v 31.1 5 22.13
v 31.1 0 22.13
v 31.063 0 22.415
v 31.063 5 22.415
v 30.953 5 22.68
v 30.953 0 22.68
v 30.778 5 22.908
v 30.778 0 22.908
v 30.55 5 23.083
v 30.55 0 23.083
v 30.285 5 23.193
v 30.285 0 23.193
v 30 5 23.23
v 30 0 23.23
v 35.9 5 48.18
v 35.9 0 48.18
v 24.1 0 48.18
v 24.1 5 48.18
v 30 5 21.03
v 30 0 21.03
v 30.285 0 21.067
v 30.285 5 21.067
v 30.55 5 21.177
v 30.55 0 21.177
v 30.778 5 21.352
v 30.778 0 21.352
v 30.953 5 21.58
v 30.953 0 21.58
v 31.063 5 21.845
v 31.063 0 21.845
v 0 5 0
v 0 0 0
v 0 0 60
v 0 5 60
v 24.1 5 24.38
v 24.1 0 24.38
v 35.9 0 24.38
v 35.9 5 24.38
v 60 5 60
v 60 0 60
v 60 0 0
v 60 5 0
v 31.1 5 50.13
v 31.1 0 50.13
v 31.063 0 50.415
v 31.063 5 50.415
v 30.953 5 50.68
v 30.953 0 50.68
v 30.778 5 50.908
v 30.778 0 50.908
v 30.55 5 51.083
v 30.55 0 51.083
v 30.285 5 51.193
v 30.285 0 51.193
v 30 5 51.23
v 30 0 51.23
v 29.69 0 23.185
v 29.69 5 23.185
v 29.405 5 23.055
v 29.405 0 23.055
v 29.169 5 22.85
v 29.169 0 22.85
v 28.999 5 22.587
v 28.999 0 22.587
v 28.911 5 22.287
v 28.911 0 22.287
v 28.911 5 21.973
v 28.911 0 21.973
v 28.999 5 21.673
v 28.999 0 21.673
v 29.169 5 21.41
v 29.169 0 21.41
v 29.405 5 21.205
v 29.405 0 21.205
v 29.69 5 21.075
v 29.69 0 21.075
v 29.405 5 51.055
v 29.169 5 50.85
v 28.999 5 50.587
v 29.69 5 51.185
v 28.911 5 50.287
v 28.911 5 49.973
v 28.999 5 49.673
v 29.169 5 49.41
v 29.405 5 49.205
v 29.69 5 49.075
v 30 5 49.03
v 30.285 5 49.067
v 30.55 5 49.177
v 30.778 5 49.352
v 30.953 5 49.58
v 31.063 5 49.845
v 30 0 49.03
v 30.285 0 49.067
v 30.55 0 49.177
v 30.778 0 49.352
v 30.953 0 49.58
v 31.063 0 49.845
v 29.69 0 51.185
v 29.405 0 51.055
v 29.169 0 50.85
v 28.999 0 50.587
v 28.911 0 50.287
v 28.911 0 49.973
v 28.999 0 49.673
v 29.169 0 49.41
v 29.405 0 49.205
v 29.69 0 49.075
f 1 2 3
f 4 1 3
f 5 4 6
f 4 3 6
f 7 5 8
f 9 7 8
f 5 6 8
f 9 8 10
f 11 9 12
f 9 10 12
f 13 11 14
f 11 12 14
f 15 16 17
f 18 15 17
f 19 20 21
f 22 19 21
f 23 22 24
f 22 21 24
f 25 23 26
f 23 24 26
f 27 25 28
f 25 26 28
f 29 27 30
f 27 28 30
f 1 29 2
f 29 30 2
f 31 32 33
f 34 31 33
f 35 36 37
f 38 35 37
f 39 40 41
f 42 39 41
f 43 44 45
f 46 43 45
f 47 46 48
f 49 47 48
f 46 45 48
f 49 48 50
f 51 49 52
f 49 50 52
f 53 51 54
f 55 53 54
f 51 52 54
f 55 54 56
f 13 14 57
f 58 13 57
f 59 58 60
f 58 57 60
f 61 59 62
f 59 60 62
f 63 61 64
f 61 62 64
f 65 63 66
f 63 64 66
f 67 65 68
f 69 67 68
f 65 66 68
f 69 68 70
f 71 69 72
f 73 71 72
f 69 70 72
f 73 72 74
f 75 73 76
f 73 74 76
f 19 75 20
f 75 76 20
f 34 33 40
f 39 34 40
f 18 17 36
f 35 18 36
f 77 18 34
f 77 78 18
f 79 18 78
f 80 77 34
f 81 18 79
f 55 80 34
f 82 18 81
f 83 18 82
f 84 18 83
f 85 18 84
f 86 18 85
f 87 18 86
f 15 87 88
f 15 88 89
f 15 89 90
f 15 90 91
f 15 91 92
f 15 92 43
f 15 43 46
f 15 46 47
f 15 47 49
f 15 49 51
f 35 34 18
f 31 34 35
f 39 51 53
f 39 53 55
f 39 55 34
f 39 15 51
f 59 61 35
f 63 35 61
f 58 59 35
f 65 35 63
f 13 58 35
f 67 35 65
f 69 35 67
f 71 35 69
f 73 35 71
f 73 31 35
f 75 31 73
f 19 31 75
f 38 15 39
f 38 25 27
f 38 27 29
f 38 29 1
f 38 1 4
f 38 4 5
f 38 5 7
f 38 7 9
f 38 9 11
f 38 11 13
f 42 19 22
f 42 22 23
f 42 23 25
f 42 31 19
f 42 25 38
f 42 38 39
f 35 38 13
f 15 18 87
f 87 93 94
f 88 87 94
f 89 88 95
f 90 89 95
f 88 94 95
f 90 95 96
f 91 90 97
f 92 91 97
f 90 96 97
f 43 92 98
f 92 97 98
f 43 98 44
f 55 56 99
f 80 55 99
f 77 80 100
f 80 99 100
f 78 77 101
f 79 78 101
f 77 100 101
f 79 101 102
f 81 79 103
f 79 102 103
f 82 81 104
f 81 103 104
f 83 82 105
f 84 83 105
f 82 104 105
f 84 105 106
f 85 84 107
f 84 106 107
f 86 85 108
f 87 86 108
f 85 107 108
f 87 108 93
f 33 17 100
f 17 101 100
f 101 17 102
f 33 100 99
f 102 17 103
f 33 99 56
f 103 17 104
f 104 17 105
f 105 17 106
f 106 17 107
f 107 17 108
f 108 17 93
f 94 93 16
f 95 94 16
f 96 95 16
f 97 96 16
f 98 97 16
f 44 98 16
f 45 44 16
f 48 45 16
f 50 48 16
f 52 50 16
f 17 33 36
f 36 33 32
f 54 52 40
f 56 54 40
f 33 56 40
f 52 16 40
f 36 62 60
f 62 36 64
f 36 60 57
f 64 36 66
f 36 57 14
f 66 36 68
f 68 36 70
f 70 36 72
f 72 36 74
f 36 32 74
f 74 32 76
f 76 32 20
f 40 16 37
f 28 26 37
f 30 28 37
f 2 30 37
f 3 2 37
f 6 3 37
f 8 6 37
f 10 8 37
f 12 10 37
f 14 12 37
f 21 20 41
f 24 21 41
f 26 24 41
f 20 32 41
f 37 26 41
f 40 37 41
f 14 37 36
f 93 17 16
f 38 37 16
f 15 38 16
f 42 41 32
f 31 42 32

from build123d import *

# Parameters (mm, degrees)
EXTRUDE_1_DEPTH = 5


with BuildPart() as part:
    # 草图1 → 凸台-拉伸1 (new body)
    with BuildSketch(Plane(origin=(0, 0, 0), x_dir=(1, 0, 0), z_dir=(0, 1, 0))):
        Polygon((30, -20.08), (30, 0), (0, 0), (0, -60), (30, -60), (30, -52.18), (24.1, -52.18), (24.1, -48.18), (24.1, -24.38), (24.1, -20.08), align=None)
        Polygon((60, 0), (30, 0), (30, -20.08), (35.9, -20.08), (35.9, -24.38), (35.9, -48.18), (35.9, -52.18), (30, -52.18), (30, -60), (60, -60), align=None)
        with BuildLine():
            Line((30, -48.18), (24.1, -48.18))
            Line((24.1, -48.18), (24.1, -52.18))
            Line((24.1, -52.18), (30, -52.18))
            Line((30, -52.18), (30, -51.23))
            ThreePointArc((30, -51.23), (28.9, -50.13), (30, -49.03))
            Line((30, -49.03), (30, -48.18))
        make_face()
        with BuildLine():
            Line((35.9, -52.18), (35.9, -48.18))
            Line((35.9, -48.18), (30, -48.18))
            Line((30, -48.18), (30, -49.03))
            ThreePointArc((30, -49.03), (30.777817459, -49.352182541), (31.1, -50.13))
            ThreePointArc((31.1, -50.13), (30.777817459, -50.907817459), (30, -51.23))
            Line((30, -51.23), (30, -52.18))
            Line((30, -52.18), (35.9, -52.18))
        make_face()
        with BuildLine():
            Line((30, -21.03), (30, -20.08))
            Line((30, -20.08), (24.1, -20.08))
            Line((24.1, -20.08), (24.1, -24.38))
            Line((24.1, -24.38), (30, -24.38))
            Line((30, -24.38), (30, -23.23))
            ThreePointArc((30, -23.23), (28.9, -22.13), (30, -21.03))
        make_face()
        with BuildLine():
            Line((35.9, -20.08), (30, -20.08))
            Line((30, -20.08), (30, -21.03))
            ThreePointArc((30, -21.03), (30.777817459, -21.352182541), (31.1, -22.13))
            ThreePointArc((31.1, -22.13), (30.777817459, -22.907817459), (30, -23.23))
            Line((30, -23.23), (30, -24.38))
            Line((30, -24.38), (35.9, -24.38))
            Line((35.9, -24.38), (35.9, -20.08))
        make_face()
    extrude(amount=EXTRUDE_1_DEPTH)


solid = part.part
